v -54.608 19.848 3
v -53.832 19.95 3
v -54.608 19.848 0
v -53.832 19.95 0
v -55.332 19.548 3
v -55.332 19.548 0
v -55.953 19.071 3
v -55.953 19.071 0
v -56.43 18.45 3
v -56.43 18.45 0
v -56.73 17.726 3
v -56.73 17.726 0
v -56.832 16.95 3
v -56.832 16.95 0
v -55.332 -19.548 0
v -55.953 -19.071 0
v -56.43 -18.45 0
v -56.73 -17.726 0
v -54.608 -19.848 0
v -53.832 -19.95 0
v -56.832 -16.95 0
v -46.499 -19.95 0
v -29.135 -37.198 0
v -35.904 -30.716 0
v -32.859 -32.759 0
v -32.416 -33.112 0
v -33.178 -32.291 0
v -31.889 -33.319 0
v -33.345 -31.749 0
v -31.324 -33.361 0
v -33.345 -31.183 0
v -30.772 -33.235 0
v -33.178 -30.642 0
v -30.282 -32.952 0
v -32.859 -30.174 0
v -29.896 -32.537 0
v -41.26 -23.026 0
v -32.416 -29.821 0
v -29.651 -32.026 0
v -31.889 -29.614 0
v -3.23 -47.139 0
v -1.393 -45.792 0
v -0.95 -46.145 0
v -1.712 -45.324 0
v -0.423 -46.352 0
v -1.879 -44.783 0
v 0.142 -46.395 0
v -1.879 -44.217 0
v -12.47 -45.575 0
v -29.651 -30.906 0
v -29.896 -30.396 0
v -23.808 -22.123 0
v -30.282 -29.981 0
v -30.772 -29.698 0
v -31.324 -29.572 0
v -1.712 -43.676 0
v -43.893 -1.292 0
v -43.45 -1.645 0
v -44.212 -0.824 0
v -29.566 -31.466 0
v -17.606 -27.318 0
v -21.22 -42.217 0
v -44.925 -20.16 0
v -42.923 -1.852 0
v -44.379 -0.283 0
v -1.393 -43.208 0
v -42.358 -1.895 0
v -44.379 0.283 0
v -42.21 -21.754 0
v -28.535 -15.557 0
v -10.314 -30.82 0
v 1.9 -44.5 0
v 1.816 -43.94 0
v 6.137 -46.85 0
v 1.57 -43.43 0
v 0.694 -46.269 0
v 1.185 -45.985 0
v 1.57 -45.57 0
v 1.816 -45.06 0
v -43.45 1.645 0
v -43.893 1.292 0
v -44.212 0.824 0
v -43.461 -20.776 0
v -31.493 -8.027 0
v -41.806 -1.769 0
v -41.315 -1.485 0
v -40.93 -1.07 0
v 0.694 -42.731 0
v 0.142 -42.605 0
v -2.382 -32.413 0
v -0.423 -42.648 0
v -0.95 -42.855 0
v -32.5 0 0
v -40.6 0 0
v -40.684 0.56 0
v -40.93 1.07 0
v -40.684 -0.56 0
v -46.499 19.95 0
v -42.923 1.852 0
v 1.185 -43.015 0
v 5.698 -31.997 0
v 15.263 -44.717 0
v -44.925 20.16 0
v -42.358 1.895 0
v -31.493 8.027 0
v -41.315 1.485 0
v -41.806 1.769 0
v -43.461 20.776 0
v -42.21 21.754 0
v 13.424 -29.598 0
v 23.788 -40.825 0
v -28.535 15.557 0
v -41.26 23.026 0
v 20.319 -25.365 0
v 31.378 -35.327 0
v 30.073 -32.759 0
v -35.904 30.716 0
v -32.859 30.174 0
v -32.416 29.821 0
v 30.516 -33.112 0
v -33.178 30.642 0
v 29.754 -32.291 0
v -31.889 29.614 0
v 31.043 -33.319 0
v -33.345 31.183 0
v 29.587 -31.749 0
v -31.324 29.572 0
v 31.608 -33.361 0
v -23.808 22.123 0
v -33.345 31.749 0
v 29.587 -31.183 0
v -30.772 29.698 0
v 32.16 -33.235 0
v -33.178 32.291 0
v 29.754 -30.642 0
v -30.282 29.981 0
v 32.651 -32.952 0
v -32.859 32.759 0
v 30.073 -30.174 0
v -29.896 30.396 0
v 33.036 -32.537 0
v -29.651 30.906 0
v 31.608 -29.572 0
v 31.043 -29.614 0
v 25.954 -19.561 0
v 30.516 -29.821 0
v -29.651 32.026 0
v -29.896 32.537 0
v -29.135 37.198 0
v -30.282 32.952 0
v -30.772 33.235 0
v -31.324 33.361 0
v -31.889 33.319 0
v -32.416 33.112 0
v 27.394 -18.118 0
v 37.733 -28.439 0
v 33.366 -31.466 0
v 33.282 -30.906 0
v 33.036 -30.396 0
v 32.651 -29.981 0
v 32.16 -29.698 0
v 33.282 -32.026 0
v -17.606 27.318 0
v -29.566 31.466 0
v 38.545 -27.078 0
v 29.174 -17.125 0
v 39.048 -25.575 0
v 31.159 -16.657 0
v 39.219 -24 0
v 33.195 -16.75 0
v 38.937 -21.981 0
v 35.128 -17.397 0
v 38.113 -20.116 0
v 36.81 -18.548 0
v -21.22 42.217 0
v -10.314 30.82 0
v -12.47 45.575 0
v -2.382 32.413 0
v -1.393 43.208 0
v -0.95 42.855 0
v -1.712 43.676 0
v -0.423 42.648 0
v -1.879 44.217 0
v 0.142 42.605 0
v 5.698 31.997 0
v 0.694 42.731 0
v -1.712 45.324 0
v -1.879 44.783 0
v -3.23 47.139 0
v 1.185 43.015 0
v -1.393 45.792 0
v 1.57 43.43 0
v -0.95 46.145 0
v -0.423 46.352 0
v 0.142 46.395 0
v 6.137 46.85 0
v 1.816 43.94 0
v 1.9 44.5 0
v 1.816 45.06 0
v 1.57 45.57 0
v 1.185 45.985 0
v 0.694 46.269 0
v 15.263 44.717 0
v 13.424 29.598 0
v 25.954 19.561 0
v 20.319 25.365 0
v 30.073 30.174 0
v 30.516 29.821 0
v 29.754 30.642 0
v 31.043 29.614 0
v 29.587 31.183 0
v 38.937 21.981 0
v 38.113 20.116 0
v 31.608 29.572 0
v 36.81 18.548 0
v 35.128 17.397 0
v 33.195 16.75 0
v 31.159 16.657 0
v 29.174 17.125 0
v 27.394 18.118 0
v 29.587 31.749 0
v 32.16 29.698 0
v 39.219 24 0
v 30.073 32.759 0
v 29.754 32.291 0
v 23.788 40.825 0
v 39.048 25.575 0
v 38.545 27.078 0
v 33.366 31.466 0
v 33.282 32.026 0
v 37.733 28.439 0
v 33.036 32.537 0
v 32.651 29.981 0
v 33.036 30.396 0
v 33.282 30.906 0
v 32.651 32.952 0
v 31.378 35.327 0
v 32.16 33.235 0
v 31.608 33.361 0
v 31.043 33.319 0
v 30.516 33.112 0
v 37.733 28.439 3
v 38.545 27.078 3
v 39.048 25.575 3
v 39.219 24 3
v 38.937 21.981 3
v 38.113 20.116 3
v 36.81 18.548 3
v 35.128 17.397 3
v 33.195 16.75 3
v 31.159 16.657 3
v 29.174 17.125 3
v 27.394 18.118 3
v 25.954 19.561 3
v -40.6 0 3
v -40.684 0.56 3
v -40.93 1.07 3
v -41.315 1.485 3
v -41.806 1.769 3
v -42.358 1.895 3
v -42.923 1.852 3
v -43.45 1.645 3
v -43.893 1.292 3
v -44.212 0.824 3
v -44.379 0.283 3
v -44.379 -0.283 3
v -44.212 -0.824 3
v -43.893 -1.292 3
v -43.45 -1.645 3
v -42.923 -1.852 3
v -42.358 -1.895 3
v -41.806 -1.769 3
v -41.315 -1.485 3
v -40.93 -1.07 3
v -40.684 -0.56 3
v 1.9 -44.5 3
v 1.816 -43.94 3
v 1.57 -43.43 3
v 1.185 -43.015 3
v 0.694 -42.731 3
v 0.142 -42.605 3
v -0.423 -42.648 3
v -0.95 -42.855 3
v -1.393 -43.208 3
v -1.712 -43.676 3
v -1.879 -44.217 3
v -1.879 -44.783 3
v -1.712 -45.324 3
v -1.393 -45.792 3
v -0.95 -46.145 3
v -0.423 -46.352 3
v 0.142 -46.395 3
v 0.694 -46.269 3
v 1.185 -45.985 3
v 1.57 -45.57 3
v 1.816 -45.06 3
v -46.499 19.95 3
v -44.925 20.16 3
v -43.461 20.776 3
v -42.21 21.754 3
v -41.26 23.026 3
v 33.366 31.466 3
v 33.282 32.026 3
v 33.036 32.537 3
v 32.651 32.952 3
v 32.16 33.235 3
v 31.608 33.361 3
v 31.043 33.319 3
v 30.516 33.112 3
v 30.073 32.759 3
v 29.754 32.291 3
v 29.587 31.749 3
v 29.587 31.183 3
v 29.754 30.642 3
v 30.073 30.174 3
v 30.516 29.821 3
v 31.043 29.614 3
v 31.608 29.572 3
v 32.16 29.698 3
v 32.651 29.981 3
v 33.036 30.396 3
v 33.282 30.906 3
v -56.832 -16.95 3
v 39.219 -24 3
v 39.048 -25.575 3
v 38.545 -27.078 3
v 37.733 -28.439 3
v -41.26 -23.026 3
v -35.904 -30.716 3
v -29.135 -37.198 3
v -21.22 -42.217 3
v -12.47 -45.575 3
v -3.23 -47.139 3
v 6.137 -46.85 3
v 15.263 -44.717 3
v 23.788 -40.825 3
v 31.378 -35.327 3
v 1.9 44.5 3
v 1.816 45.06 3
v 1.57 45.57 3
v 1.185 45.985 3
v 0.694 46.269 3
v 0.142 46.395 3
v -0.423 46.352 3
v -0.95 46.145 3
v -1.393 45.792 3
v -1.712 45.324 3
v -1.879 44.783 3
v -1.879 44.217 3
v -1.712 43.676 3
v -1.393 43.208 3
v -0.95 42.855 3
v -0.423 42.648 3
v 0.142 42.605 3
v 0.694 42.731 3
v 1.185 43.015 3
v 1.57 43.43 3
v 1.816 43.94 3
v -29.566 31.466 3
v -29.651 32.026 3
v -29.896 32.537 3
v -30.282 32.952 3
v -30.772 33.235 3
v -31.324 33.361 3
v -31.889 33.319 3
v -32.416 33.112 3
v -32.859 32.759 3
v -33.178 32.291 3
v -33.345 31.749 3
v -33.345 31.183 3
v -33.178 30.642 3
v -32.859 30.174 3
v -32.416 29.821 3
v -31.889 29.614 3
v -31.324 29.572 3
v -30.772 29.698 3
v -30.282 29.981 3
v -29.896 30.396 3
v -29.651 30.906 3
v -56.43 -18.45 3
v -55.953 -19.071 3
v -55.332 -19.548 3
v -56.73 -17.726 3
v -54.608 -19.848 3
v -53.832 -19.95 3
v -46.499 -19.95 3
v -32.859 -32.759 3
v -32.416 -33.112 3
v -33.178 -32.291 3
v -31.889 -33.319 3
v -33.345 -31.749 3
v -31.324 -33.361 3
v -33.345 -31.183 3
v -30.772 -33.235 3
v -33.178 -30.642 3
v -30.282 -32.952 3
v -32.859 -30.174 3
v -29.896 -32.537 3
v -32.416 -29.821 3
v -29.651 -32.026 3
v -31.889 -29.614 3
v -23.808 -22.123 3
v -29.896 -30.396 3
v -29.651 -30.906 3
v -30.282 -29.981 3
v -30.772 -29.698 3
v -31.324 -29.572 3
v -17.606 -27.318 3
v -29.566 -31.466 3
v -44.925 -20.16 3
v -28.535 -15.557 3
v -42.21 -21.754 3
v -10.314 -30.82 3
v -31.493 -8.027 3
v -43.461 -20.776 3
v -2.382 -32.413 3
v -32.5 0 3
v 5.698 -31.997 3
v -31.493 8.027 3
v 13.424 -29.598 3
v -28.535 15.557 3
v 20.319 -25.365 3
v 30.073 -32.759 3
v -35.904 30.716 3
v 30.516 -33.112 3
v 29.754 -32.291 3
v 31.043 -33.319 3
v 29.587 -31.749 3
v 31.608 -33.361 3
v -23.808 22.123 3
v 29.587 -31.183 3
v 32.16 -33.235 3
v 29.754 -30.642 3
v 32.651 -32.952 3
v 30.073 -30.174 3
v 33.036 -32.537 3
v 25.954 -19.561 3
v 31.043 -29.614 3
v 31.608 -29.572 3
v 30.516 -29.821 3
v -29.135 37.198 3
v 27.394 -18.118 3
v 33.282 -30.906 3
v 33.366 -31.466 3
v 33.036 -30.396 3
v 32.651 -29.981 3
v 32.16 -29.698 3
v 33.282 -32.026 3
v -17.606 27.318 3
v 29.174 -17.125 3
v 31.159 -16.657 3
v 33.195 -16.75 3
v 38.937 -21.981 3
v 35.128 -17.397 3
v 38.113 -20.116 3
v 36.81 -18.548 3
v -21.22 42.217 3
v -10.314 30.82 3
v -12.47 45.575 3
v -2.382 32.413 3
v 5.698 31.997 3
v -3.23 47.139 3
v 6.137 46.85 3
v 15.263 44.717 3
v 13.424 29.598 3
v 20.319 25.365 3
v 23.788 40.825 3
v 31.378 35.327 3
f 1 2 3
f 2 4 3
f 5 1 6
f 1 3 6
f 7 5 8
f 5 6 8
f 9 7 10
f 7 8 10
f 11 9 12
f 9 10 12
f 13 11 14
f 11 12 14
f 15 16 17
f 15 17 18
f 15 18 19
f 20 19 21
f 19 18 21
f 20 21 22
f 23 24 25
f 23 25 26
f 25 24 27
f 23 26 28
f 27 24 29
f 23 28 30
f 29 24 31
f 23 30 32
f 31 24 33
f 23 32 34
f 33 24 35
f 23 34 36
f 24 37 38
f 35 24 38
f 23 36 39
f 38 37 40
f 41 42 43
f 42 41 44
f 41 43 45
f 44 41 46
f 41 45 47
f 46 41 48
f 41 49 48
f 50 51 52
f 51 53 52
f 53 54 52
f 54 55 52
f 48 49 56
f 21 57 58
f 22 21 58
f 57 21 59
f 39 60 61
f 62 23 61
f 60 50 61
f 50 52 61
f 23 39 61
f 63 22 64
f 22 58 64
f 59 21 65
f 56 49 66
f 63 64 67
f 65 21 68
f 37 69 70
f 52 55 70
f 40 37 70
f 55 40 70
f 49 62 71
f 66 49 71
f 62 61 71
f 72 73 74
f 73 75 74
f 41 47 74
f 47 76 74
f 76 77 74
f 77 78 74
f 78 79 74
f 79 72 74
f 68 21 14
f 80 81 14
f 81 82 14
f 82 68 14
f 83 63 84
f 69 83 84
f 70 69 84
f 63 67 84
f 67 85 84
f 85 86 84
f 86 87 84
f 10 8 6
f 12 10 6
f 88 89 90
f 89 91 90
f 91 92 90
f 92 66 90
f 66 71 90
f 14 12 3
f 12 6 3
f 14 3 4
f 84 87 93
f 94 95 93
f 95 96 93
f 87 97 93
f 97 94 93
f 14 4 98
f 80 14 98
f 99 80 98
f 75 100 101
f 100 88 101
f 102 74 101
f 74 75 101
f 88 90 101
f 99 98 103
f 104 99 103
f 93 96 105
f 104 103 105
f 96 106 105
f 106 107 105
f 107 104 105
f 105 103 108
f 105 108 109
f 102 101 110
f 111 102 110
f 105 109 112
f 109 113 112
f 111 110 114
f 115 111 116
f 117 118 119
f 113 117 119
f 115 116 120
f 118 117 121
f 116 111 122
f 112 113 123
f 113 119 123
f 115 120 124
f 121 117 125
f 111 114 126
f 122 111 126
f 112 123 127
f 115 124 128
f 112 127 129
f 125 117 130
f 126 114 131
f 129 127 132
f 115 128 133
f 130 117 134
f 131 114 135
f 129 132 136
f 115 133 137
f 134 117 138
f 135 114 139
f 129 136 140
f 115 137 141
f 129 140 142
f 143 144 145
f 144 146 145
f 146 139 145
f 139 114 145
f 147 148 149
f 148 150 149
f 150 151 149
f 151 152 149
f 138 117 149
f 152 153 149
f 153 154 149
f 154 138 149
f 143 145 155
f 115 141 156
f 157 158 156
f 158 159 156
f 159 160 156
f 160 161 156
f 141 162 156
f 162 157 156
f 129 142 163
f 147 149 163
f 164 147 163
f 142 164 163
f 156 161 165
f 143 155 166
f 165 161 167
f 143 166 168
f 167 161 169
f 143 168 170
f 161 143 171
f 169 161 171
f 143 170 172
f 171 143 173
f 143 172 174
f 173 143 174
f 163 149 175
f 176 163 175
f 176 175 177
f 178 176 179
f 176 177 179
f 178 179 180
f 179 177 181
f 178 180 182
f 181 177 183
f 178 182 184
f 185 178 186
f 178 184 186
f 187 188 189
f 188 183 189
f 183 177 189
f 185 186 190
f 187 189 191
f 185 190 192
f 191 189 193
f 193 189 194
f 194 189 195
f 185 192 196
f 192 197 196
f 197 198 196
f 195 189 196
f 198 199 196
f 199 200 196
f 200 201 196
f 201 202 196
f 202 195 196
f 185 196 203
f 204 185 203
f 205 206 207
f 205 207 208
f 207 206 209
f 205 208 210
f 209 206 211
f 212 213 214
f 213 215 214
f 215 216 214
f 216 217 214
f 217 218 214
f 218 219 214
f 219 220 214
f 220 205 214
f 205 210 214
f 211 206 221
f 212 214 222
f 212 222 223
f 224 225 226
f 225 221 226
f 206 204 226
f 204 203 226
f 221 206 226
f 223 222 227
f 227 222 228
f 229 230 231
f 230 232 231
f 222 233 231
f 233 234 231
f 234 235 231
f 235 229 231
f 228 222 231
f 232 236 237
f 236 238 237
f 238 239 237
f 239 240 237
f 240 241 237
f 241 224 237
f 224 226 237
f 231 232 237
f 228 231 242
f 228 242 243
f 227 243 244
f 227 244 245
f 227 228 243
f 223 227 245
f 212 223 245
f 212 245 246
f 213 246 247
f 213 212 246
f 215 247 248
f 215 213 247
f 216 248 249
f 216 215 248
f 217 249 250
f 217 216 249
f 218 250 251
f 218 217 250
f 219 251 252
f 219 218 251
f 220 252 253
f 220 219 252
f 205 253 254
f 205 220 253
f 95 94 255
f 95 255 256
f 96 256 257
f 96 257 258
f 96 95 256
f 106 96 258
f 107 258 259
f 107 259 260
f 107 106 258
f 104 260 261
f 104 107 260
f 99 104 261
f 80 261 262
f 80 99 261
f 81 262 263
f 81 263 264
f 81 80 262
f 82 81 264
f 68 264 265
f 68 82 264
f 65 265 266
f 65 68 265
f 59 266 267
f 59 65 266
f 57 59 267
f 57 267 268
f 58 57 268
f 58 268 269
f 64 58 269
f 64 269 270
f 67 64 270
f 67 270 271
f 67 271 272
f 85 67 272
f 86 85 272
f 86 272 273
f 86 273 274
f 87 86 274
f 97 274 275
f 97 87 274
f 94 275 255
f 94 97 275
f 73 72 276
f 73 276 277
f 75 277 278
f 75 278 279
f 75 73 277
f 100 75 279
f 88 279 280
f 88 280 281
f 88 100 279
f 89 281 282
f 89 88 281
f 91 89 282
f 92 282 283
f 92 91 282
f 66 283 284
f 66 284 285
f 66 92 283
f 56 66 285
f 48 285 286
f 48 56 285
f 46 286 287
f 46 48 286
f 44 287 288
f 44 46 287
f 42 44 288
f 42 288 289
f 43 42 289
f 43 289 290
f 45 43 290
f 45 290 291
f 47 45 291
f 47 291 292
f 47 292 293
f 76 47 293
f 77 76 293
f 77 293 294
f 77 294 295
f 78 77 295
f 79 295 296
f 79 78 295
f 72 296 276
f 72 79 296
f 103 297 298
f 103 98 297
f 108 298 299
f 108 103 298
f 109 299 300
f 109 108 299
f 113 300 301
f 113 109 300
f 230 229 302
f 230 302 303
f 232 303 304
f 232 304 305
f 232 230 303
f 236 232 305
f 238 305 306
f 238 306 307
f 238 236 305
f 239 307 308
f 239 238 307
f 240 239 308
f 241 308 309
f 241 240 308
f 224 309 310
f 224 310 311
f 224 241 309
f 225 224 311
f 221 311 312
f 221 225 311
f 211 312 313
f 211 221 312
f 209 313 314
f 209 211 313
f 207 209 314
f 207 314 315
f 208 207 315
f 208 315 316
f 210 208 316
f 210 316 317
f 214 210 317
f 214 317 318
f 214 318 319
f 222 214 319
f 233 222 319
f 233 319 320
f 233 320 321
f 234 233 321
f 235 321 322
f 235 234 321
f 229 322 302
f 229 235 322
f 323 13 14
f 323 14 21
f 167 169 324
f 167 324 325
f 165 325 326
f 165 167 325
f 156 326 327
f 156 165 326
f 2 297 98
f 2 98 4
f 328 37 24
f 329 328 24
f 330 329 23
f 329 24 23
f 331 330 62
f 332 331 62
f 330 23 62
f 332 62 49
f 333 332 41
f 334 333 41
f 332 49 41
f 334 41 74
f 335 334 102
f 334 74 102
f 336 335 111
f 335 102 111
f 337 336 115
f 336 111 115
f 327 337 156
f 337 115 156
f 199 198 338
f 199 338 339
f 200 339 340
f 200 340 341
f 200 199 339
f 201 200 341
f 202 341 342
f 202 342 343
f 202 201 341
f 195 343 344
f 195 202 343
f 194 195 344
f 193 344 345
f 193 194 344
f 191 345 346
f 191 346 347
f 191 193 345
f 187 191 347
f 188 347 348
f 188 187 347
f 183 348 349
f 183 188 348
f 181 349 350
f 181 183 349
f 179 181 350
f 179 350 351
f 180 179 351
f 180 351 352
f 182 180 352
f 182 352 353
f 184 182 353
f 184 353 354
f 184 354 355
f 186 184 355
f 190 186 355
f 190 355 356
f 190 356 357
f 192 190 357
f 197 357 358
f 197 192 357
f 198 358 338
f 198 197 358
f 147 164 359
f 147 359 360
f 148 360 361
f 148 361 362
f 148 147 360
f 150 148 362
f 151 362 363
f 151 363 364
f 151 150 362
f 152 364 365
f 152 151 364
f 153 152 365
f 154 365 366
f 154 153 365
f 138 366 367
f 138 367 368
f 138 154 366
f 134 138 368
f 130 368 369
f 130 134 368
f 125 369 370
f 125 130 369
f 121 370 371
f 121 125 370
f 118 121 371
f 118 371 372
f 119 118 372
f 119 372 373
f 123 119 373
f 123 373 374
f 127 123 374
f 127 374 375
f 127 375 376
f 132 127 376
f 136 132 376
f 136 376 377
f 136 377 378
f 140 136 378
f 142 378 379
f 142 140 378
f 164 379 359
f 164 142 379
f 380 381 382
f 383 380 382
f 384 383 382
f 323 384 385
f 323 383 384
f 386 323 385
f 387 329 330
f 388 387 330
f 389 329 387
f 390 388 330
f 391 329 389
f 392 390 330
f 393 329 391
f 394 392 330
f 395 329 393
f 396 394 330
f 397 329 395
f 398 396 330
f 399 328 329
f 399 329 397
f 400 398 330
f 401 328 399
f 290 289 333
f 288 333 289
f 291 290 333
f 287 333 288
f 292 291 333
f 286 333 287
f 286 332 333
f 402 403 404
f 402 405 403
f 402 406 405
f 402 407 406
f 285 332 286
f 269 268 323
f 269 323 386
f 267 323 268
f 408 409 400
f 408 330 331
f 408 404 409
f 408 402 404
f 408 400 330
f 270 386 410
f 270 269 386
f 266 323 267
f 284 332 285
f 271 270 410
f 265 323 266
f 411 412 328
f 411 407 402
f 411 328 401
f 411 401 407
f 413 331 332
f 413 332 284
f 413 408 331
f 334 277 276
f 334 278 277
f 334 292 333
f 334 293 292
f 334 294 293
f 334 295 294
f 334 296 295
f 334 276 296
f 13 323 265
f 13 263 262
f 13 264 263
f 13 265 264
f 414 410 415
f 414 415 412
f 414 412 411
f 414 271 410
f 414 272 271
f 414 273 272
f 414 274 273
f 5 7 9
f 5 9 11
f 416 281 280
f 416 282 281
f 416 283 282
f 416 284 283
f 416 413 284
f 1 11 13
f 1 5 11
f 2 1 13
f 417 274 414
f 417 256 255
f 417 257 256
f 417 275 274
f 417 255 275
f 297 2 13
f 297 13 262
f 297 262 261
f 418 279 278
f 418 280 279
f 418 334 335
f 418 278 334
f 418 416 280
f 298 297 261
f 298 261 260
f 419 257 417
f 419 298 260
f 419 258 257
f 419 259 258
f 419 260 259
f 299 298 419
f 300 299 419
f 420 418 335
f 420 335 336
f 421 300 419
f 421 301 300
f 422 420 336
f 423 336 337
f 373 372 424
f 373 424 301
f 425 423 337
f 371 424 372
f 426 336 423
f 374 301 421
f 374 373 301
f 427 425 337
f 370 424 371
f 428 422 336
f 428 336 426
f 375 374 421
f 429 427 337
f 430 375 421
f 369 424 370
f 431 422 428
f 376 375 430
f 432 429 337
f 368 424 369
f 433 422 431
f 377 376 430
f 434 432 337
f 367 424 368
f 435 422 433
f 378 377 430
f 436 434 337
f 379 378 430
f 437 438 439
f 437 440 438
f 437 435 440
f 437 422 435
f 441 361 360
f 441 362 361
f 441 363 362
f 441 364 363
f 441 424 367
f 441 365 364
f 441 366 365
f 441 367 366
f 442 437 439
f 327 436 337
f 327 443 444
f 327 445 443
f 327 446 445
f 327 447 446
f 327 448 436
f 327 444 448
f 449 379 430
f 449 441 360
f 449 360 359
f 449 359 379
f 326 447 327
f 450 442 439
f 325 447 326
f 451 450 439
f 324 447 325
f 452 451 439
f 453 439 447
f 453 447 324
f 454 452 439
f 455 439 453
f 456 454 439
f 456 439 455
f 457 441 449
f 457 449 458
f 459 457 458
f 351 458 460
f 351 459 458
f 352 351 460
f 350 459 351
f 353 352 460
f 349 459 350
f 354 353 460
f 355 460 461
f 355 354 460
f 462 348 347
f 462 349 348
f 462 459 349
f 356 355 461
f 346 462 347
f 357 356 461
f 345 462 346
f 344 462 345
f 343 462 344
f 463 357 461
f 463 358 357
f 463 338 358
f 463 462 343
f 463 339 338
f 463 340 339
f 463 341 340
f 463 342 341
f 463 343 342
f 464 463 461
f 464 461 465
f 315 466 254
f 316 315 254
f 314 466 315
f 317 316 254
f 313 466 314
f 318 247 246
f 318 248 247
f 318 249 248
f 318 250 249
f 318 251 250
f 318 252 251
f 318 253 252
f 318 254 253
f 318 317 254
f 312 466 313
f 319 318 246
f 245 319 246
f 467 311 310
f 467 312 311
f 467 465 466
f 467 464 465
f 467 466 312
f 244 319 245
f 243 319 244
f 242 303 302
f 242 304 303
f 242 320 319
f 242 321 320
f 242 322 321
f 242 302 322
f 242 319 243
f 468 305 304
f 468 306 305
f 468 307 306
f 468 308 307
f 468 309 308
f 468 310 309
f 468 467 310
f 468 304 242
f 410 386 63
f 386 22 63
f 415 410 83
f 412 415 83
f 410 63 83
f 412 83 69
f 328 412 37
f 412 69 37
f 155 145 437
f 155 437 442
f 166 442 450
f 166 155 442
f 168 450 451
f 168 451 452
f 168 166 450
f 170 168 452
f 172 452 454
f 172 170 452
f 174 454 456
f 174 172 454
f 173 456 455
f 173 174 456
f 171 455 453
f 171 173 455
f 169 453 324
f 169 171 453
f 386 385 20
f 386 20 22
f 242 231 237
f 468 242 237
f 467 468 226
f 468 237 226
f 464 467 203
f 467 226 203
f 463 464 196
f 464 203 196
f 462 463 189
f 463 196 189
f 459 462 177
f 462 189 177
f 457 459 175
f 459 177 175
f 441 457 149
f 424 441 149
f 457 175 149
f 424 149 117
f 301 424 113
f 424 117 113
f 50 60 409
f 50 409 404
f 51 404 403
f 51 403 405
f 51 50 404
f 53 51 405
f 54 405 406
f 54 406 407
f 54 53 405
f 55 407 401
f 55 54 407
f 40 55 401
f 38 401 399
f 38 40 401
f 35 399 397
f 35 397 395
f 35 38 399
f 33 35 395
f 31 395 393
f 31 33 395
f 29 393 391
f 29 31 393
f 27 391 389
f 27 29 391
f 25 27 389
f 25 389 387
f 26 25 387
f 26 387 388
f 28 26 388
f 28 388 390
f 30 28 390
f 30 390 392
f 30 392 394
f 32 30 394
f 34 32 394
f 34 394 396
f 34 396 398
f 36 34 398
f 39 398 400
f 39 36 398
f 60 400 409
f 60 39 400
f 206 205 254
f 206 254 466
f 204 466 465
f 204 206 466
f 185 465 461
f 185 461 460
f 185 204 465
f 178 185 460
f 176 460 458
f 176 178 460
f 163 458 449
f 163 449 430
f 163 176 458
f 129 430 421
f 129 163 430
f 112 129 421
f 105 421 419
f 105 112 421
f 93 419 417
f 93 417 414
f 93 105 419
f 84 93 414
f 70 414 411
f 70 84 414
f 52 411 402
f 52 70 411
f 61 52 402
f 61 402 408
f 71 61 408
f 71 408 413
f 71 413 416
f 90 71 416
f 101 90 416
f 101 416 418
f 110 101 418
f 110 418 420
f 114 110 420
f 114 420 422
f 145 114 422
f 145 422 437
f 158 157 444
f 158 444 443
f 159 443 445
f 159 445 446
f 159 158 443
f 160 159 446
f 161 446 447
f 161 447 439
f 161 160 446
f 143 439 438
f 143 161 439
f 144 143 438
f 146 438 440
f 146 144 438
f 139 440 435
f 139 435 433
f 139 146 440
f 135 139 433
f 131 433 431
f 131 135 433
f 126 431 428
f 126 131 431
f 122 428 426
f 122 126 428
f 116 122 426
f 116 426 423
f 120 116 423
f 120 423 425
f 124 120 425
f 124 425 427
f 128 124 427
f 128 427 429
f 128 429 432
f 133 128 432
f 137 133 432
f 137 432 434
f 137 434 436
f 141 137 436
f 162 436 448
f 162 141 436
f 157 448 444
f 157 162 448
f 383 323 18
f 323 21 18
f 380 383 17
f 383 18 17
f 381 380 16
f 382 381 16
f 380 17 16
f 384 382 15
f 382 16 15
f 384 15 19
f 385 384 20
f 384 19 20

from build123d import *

# Parameters (mm, degrees)
SKETCH_1_R          = 47.25
SKETCH_1_R_2        = 1.9
SKETCH_1_R_3        = 32.5
EXTRUDE_1_DEPTH     = 3
CUT_EXTRUDE_START   = -3
CUT_EXTRUDE_1_DEPTH = 3
EXTRUDE_2_DEPTH     = 3
FILLET_1_R          = 3
FILLET_2_R          = 6


with BuildPart() as part:
    # 草图1 → 凸台-拉伸1 (new body)
    with BuildSketch(Plane.XY):
        Circle(SKETCH_1_R)
        with Locations((-31.466251763, -31.466251763)):
            Circle(SKETCH_1_R_2, mode=Mode.SUBTRACT)
        with Locations((-42.5, 0)):
            Circle(SKETCH_1_R_2, mode=Mode.SUBTRACT)
        Circle(SKETCH_1_R_3, mode=Mode.SUBTRACT)
        with Locations((0, -44.5)):
            Circle(SKETCH_1_R_2, mode=Mode.SUBTRACT)
        with Locations((31.466251763, -31.466251763)):
            Circle(SKETCH_1_R_2, mode=Mode.SUBTRACT)
        with Locations((-31.466251763, 31.466251763)):
            Circle(SKETCH_1_R_2, mode=Mode.SUBTRACT)
        with Locations((0, 44.5)):
            Circle(SKETCH_1_R_2, mode=Mode.SUBTRACT)
        with Locations((42.5, 0)):
            Circle(SKETCH_1_R_2, mode=Mode.SUBTRACT)
        with Locations((31.466251763, 31.466251763)):
            Circle(SKETCH_1_R_2, mode=Mode.SUBTRACT)
    extrude(amount=EXTRUDE_1_DEPTH)

    # 草图2 → 切除-拉伸1 (cut)
    with BuildSketch(Plane.XY.offset(3).offset(CUT_EXTRUDE_START)):
        with BuildLine():
            ThreePointArc((40.6, 0), (42.5, 1.9), (44.4, 0))
            Line((44.4, 0), (47.25, 0))
            ThreePointArc((47.25, 0), (44.807674543, 14.994492391), (37.733182981, 28.438871323))
            ThreePointArc((37.733182981, 28.438871323), (38.837402493, 26.340410113), (39.218611997, 24))
            ThreePointArc((39.218611997, 24), (34.184022114, 17.006209505), (25.954041018, 19.561128669))
            ThreePointArc((25.954041018, 19.561128669), (30.820093552, 10.313672161), (32.5, 0))
            Line((32.5, 0), (40.6, 0))
        make_face()
        with BuildLine():
            Line((47.25, 0), (44.4, 0))
            ThreePointArc((44.4, 0), (42.5, -1.9), (40.6, 0))
            Line((40.6, 0), (32.5, 0))
            ThreePointArc((32.5, 0), (30.820093563, -10.313672127), (25.954041062, -19.561128611))
            ThreePointArc((25.954041062, -19.561128611), (34.184022149, -17.006209517), (39.218611997, -24))
            ThreePointArc((39.218611997, -24), (38.837402455, -26.340410225), (37.733182838, -28.438871512))
            ThreePointArc((37.733182838, -28.438871512), (44.807674505, -14.994492504), (47.25, 0))
        make_face()
    extrude(amount=CUT_EXTRUDE_1_DEPTH, mode=Mode.SUBTRACT)


with BuildPart() as cut_extrude_1_kept_piece:
    # of the separate pieces the step leaves, the one the design keeps (cut_extrude_1_pieces_kept)
    add(part.part.solids().sort_by_distance((-29.566251763, -31.466251763, 3))[0])

    # 草图3 → 凸台-拉伸2 (add)
    with BuildSketch(Plane.XY.offset(3)):
        with BuildLine():
            Line((-42.831763914, 19.95), (-56.831763914, 19.95))
            Line((-56.831763914, 19.95), (-56.831763914, 0))
            Line((-56.831763914, 0), (-47.25, 0))
            ThreePointArc((-47.25, 0), (-46.132219462, 10.216693571), (-42.831763914, 19.95))
        make_face()
        with BuildLine():
            Line((-47.25, 0), (-56.831763914, 0))
            Line((-56.831763914, 0), (-56.831763914, -19.95))
            Line((-56.831763914, -19.95), (-42.831763914, -19.95))
            ThreePointArc((-42.831763914, -19.95), (-46.132219462, -10.216693571), (-47.25, 0))
        make_face()
    extrude(amount=-EXTRUDE_2_DEPTH)

    # 圆角1
    fillet_1_edges = [cut_extrude_1_kept_piece.edges().sort_by_distance(p)[0] for p in [
        (-56.831763914, -19.95, 1.5),
        (-56.831763914, 19.95, 1.5),
    ]]
    fillet(fillet_1_edges, radius=FILLET_1_R)

    # 圆角2
    fillet_2_edges = [cut_extrude_1_kept_piece.edges().sort_by_distance(p)[0] for p in [
        (-42.831763914, 19.95, 1.5),
        (-42.831763914, -19.95, 1.5),
    ]]
    fillet(fillet_2_edges, radius=FILLET_2_R)


solid = cut_extrude_1_kept_piece.part
